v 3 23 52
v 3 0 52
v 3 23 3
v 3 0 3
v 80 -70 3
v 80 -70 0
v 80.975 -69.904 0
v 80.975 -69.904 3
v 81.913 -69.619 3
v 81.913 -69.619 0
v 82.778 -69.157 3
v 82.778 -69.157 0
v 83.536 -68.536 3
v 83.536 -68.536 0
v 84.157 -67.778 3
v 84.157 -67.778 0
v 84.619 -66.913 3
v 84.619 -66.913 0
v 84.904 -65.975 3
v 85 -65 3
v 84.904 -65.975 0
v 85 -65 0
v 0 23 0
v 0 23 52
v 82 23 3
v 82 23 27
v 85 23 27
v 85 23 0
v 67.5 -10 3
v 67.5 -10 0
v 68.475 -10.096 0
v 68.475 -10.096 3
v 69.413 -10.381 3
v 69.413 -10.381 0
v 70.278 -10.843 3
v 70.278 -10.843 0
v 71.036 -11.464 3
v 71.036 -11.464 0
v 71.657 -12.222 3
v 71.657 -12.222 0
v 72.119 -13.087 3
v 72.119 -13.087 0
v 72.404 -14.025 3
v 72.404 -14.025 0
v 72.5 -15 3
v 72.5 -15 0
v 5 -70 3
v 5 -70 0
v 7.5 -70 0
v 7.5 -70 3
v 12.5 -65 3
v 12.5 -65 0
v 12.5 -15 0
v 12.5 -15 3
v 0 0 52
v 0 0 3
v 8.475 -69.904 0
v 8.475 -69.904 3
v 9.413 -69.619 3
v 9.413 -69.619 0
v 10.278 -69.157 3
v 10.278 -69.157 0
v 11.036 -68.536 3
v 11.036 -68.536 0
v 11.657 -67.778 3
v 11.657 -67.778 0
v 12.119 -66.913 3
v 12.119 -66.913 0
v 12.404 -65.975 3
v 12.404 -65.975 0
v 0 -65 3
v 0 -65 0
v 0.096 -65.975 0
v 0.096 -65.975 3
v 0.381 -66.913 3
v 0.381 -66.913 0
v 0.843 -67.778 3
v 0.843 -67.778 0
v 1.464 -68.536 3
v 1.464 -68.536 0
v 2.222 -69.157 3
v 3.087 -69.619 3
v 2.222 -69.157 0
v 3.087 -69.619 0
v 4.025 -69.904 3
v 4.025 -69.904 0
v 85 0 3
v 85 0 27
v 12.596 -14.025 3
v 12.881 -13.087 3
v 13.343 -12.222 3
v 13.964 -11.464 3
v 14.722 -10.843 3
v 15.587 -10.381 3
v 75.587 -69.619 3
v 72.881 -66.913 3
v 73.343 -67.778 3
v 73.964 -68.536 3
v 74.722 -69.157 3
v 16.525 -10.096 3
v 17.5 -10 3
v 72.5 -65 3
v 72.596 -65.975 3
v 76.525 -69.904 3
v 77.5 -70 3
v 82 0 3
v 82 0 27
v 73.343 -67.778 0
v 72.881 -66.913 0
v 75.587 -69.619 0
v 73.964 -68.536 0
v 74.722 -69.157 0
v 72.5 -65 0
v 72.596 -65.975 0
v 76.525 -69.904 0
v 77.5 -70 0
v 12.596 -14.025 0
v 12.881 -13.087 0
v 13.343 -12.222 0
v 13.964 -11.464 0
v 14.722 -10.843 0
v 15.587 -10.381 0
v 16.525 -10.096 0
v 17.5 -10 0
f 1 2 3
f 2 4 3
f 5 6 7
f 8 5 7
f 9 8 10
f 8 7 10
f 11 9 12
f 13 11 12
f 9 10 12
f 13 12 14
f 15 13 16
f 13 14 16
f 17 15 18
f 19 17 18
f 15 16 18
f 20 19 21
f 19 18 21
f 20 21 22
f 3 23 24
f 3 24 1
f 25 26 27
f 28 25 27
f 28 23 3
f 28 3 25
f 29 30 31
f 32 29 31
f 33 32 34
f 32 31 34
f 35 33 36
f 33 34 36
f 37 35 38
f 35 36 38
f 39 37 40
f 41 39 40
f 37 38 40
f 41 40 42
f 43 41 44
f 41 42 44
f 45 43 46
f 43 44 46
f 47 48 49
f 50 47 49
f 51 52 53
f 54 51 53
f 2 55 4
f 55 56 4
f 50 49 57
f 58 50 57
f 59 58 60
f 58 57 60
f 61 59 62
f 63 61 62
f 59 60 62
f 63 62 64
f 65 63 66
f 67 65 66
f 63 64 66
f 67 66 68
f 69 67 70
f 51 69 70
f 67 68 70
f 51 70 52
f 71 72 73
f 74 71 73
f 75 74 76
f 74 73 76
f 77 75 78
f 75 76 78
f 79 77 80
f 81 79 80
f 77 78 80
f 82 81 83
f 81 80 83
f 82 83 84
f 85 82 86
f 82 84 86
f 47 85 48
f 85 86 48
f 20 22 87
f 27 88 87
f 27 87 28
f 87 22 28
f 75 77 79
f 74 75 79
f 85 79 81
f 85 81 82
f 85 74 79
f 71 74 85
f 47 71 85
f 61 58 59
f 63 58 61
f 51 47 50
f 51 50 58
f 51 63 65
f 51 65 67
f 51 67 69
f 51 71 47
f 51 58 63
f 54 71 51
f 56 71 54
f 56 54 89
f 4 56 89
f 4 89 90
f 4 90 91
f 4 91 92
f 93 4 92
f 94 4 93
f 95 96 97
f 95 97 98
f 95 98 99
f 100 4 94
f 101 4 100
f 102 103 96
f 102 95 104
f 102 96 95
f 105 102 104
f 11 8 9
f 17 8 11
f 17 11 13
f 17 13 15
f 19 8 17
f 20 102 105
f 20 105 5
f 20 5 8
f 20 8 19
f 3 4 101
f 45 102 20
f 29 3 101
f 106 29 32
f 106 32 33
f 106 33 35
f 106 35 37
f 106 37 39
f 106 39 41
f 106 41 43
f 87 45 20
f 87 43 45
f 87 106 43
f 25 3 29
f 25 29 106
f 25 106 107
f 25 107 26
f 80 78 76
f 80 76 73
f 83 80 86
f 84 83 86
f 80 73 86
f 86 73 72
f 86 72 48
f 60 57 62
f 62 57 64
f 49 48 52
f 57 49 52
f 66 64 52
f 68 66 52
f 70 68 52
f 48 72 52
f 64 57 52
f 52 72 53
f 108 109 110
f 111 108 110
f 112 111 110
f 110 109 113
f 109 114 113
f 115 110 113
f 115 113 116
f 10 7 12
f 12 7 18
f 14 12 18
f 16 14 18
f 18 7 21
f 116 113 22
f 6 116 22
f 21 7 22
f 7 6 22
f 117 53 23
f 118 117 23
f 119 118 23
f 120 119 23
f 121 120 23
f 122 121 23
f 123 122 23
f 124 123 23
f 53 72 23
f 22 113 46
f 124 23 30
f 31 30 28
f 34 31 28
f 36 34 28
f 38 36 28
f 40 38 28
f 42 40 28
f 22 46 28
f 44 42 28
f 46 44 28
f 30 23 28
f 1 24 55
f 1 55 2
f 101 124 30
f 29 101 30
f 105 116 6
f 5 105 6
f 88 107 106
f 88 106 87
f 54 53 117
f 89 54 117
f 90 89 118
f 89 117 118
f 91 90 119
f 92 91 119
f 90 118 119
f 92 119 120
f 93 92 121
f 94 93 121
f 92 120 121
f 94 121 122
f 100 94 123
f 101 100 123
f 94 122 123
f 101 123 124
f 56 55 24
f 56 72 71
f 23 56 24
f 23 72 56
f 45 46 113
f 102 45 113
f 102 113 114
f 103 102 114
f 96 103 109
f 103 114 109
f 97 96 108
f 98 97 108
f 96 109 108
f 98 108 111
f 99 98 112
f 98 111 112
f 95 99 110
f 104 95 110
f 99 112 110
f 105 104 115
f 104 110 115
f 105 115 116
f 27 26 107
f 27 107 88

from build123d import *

# Parameters (mm, degrees)
F0_W     = 85
F0_H     = 23
F1_DEPTH = 3
F2_W     = 3
F2_H     = 23
F3_DEPTH = 24
F4_W     = 3
F4_H     = 23
F5_DEPTH = 25


with BuildPart() as f1:
    # F0 (on Top) → F1 (new body)
    with BuildSketch(Plane.XY):
        with Locations((42.5, 11.5)):
            Rectangle(F0_W, F0_H)
        with BuildLine():
            Line((85, 0), (0, 0))
            Line((0, 0), (0, -10))
            Line((0, -10), (0, -65))
            ThreePointArc((0, -65), (1.464466, -68.535534), (5, -70))
            Line((5, -70), (7.5, -70))
            ThreePointArc((7.5, -70), (11.035534, -68.535534), (12.5, -65))
            Line((12.5, -65), (12.5, -15))
            ThreePointArc((12.5, -15), (13.964466, -11.464466), (17.5, -10))
            Line((17.5, -10), (67.5, -10))
            ThreePointArc((67.5, -10), (71.035534, -11.464466), (72.5, -15))
            Line((72.5, -15), (72.5, -65))
            ThreePointArc((72.5, -65), (73.964466, -68.535534), (77.5, -70))
            Line((77.5, -70), (80, -70))
            ThreePointArc((80, -70), (83.535534, -68.535534), (85, -65))
            Line((85, -65), (85, -10))
            Line((85, -10), (85, 0))
        make_face()
    extrude(amount=F1_DEPTH)

    # F2 (on face) → F3 (join)
    with BuildSketch(Plane.XY.offset(3)):
        with Locations((1.5, 11.5)):
            Rectangle(F2_W, F2_H)
        with Locations((83.5, 11.5)):
            Rectangle(F2_W, F2_H)
    extrude(amount=F3_DEPTH)

    # F4 (on face) → F5 (join)
    with BuildSketch(Plane.XY.offset(27)):
        with Locations((1.5, 11.5)):
            Rectangle(F4_W, F4_H)
    extrude(amount=F5_DEPTH)


solid = f1.part
